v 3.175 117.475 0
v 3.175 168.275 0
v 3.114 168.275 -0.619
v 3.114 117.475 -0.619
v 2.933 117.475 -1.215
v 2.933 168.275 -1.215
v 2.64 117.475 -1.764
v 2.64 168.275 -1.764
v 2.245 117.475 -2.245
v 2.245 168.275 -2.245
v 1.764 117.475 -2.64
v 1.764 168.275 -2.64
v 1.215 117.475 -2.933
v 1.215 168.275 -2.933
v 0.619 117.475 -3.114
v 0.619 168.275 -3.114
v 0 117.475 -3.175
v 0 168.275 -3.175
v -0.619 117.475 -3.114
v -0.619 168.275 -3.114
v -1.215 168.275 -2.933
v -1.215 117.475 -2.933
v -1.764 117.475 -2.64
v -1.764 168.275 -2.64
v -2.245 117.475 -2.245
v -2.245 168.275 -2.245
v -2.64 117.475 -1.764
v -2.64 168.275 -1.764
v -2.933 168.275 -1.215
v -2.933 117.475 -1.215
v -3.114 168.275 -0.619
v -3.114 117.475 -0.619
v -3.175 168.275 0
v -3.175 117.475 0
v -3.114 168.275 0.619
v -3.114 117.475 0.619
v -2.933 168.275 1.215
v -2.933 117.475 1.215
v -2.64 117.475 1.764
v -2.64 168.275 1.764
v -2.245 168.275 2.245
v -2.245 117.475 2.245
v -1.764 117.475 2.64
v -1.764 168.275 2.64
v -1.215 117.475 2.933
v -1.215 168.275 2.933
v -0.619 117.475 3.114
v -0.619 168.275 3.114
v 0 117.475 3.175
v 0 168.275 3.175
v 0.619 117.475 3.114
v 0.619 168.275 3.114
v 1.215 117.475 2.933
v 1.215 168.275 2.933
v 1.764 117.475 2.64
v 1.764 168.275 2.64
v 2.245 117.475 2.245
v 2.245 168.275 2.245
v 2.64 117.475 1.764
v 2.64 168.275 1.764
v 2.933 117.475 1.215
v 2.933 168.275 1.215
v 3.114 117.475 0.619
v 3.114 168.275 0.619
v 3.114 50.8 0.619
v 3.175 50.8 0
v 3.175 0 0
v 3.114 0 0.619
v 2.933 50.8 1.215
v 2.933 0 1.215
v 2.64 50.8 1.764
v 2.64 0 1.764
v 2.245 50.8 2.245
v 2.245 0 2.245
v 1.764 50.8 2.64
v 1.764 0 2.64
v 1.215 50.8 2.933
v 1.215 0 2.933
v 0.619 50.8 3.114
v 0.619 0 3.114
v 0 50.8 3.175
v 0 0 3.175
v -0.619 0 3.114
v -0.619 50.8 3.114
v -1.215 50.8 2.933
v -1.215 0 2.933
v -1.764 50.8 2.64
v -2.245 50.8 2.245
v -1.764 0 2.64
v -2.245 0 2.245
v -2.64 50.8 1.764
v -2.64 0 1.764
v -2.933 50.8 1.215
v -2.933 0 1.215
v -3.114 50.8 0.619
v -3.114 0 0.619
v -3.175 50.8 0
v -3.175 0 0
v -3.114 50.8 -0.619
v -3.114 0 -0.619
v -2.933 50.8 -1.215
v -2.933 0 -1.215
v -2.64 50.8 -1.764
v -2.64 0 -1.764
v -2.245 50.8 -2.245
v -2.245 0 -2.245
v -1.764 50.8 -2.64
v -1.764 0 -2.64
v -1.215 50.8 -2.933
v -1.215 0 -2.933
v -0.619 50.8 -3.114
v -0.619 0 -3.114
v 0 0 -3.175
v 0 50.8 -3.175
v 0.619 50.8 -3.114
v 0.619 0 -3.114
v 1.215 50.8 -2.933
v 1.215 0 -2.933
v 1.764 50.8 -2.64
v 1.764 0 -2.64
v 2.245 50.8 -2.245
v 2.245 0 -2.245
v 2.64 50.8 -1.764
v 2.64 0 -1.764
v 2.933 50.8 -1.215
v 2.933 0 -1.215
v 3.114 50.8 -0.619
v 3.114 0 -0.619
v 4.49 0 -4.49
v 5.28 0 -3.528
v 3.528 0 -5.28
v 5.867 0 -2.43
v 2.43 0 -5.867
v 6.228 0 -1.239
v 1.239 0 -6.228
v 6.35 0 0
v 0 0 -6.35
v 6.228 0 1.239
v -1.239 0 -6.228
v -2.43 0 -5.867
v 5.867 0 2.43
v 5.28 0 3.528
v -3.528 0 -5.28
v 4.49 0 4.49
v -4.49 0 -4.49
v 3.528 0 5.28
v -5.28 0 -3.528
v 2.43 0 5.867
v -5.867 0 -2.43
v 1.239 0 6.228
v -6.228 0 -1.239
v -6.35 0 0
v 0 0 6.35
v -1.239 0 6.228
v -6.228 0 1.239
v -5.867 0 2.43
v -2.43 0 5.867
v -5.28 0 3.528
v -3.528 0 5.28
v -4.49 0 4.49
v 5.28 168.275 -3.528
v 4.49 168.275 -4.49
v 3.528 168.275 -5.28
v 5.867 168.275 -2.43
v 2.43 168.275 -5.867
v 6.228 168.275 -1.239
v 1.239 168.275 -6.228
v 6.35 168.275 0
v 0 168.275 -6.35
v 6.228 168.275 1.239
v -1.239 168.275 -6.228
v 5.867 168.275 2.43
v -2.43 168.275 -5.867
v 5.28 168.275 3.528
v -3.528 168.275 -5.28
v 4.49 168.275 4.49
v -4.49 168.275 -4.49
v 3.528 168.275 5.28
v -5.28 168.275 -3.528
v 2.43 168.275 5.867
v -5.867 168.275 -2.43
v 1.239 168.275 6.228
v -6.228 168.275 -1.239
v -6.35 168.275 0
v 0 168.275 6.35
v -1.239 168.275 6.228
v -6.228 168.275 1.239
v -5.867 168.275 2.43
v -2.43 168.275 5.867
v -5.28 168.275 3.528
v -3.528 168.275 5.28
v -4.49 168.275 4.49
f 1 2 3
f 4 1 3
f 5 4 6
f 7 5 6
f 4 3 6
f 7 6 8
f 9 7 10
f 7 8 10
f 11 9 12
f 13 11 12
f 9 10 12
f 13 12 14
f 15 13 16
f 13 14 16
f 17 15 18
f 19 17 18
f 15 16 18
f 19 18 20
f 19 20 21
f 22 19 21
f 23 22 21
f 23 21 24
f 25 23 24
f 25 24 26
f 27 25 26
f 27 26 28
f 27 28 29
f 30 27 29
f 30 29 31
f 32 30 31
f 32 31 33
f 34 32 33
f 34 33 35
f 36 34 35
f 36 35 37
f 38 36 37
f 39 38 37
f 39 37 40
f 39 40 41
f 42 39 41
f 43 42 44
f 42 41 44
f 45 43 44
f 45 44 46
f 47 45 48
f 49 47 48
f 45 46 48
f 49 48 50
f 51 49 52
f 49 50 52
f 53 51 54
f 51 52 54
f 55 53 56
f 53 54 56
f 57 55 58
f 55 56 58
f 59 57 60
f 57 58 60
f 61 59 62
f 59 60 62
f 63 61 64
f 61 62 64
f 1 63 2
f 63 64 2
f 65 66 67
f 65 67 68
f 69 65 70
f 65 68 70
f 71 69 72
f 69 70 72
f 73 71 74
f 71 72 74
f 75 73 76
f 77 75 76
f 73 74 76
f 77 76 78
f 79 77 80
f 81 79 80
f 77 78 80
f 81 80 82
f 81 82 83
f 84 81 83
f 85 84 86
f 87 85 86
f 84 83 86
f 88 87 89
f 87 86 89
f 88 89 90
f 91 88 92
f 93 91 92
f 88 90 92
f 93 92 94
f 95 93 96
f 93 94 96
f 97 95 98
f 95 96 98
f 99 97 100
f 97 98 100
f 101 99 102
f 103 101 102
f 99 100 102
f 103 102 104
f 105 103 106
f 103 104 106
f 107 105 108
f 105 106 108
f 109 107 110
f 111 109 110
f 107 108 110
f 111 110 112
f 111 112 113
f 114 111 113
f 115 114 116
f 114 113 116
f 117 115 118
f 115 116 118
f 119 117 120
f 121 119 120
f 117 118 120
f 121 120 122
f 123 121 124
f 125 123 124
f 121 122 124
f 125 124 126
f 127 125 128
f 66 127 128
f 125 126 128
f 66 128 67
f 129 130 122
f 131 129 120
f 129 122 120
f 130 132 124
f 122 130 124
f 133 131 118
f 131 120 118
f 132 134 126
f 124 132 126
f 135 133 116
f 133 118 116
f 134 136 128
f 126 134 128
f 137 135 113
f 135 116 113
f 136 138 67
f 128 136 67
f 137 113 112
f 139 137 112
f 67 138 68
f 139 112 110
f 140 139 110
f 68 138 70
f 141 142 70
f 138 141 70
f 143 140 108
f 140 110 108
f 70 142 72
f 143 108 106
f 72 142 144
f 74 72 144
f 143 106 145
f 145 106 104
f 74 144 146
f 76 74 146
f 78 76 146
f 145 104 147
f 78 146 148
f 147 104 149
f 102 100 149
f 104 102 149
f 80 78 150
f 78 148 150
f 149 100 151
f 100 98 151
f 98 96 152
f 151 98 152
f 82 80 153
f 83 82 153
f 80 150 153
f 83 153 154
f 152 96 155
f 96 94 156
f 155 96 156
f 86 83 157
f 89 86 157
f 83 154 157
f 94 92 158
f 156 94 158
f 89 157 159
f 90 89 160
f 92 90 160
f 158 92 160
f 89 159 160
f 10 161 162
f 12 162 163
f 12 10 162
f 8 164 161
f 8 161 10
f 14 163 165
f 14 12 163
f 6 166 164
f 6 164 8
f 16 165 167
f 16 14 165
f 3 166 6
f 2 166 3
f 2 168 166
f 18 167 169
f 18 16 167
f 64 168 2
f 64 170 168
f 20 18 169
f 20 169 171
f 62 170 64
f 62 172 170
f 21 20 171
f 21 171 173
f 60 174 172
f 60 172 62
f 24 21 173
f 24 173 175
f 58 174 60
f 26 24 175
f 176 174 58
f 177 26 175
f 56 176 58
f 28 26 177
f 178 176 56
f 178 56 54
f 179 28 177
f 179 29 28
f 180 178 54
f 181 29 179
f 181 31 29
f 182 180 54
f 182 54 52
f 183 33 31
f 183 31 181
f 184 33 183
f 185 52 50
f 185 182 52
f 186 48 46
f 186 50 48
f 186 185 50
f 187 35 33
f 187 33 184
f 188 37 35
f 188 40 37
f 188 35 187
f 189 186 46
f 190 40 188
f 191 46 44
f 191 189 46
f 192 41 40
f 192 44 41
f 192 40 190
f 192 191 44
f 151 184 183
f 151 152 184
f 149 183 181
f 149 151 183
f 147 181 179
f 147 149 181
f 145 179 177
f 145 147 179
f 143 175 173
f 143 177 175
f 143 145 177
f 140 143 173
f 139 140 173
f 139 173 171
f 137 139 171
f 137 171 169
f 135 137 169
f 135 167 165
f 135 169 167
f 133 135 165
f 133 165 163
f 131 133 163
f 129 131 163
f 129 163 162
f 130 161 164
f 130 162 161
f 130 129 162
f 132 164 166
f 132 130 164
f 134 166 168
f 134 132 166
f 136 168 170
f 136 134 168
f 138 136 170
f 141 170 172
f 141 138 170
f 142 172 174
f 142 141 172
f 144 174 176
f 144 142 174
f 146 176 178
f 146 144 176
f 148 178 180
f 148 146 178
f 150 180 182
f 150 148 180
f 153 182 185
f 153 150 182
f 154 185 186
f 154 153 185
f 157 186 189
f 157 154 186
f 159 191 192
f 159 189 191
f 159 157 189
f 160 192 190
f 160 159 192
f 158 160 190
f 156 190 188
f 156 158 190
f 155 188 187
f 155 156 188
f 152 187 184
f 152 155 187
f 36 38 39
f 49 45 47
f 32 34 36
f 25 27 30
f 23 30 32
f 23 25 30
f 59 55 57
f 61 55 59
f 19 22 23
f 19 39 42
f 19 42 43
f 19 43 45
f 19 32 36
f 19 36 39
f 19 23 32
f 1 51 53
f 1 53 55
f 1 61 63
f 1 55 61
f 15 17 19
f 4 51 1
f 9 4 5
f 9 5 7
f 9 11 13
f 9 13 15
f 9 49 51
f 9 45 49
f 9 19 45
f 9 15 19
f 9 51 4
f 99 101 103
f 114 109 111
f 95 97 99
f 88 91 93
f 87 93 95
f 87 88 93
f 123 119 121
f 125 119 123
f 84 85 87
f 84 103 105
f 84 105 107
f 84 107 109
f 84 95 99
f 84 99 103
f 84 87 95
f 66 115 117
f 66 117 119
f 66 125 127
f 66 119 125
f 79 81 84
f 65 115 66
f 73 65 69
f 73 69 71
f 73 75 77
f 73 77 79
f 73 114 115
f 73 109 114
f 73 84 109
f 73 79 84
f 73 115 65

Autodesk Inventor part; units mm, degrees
ref_plane "YZ Plane" through (0, 0, 0) normal (1, 0, 0) x (0, 1, 0)
ref_plane "XZ Plane" through (0, 0, 0) normal (0, 1, 0) x (-1, 0, 0)
ref_plane "XY Plane" through (0, 0, 0) normal (0, 0, 1) x (1, 0, 0)
sketch "Sketch1" plane through (0, 0, 0) normal (0, 1, 0) x (-1, 0, 0)
  circle A0 centre (0, 0) radius 6.35
  dimension "d0" = 12.7
extrude "Extrusion1" add sketch "Sketch1" along normal blind 168.275
sketch "Sketch2" plane through (0, 0, 0) normal (0, -1, 0) x (1, 0, 0)
  circle A0 centre (0, 0) radius 3.175
  dimension "d3" = 6.35
extrude "Extrusion2" cut sketch "Sketch2" against normal blind 50.8
sketch "Sketch3" plane through (0, 168.275, 0) normal (0, 1, 0) x (1, 0, 0)
  circle A0 centre (0, 0) radius 3.175
  dimension "d6" = 6.35
extrude "Extrusion3" cut sketch "Sketch3" against normal blind 50.8
thread "Thread1" size "1/4-20 UNC" class "2B" standard "ANSI Unified Screw Threads" full length
properties part number "SHOT_0_003_PivotShaft" material "Aluminum 6061"
